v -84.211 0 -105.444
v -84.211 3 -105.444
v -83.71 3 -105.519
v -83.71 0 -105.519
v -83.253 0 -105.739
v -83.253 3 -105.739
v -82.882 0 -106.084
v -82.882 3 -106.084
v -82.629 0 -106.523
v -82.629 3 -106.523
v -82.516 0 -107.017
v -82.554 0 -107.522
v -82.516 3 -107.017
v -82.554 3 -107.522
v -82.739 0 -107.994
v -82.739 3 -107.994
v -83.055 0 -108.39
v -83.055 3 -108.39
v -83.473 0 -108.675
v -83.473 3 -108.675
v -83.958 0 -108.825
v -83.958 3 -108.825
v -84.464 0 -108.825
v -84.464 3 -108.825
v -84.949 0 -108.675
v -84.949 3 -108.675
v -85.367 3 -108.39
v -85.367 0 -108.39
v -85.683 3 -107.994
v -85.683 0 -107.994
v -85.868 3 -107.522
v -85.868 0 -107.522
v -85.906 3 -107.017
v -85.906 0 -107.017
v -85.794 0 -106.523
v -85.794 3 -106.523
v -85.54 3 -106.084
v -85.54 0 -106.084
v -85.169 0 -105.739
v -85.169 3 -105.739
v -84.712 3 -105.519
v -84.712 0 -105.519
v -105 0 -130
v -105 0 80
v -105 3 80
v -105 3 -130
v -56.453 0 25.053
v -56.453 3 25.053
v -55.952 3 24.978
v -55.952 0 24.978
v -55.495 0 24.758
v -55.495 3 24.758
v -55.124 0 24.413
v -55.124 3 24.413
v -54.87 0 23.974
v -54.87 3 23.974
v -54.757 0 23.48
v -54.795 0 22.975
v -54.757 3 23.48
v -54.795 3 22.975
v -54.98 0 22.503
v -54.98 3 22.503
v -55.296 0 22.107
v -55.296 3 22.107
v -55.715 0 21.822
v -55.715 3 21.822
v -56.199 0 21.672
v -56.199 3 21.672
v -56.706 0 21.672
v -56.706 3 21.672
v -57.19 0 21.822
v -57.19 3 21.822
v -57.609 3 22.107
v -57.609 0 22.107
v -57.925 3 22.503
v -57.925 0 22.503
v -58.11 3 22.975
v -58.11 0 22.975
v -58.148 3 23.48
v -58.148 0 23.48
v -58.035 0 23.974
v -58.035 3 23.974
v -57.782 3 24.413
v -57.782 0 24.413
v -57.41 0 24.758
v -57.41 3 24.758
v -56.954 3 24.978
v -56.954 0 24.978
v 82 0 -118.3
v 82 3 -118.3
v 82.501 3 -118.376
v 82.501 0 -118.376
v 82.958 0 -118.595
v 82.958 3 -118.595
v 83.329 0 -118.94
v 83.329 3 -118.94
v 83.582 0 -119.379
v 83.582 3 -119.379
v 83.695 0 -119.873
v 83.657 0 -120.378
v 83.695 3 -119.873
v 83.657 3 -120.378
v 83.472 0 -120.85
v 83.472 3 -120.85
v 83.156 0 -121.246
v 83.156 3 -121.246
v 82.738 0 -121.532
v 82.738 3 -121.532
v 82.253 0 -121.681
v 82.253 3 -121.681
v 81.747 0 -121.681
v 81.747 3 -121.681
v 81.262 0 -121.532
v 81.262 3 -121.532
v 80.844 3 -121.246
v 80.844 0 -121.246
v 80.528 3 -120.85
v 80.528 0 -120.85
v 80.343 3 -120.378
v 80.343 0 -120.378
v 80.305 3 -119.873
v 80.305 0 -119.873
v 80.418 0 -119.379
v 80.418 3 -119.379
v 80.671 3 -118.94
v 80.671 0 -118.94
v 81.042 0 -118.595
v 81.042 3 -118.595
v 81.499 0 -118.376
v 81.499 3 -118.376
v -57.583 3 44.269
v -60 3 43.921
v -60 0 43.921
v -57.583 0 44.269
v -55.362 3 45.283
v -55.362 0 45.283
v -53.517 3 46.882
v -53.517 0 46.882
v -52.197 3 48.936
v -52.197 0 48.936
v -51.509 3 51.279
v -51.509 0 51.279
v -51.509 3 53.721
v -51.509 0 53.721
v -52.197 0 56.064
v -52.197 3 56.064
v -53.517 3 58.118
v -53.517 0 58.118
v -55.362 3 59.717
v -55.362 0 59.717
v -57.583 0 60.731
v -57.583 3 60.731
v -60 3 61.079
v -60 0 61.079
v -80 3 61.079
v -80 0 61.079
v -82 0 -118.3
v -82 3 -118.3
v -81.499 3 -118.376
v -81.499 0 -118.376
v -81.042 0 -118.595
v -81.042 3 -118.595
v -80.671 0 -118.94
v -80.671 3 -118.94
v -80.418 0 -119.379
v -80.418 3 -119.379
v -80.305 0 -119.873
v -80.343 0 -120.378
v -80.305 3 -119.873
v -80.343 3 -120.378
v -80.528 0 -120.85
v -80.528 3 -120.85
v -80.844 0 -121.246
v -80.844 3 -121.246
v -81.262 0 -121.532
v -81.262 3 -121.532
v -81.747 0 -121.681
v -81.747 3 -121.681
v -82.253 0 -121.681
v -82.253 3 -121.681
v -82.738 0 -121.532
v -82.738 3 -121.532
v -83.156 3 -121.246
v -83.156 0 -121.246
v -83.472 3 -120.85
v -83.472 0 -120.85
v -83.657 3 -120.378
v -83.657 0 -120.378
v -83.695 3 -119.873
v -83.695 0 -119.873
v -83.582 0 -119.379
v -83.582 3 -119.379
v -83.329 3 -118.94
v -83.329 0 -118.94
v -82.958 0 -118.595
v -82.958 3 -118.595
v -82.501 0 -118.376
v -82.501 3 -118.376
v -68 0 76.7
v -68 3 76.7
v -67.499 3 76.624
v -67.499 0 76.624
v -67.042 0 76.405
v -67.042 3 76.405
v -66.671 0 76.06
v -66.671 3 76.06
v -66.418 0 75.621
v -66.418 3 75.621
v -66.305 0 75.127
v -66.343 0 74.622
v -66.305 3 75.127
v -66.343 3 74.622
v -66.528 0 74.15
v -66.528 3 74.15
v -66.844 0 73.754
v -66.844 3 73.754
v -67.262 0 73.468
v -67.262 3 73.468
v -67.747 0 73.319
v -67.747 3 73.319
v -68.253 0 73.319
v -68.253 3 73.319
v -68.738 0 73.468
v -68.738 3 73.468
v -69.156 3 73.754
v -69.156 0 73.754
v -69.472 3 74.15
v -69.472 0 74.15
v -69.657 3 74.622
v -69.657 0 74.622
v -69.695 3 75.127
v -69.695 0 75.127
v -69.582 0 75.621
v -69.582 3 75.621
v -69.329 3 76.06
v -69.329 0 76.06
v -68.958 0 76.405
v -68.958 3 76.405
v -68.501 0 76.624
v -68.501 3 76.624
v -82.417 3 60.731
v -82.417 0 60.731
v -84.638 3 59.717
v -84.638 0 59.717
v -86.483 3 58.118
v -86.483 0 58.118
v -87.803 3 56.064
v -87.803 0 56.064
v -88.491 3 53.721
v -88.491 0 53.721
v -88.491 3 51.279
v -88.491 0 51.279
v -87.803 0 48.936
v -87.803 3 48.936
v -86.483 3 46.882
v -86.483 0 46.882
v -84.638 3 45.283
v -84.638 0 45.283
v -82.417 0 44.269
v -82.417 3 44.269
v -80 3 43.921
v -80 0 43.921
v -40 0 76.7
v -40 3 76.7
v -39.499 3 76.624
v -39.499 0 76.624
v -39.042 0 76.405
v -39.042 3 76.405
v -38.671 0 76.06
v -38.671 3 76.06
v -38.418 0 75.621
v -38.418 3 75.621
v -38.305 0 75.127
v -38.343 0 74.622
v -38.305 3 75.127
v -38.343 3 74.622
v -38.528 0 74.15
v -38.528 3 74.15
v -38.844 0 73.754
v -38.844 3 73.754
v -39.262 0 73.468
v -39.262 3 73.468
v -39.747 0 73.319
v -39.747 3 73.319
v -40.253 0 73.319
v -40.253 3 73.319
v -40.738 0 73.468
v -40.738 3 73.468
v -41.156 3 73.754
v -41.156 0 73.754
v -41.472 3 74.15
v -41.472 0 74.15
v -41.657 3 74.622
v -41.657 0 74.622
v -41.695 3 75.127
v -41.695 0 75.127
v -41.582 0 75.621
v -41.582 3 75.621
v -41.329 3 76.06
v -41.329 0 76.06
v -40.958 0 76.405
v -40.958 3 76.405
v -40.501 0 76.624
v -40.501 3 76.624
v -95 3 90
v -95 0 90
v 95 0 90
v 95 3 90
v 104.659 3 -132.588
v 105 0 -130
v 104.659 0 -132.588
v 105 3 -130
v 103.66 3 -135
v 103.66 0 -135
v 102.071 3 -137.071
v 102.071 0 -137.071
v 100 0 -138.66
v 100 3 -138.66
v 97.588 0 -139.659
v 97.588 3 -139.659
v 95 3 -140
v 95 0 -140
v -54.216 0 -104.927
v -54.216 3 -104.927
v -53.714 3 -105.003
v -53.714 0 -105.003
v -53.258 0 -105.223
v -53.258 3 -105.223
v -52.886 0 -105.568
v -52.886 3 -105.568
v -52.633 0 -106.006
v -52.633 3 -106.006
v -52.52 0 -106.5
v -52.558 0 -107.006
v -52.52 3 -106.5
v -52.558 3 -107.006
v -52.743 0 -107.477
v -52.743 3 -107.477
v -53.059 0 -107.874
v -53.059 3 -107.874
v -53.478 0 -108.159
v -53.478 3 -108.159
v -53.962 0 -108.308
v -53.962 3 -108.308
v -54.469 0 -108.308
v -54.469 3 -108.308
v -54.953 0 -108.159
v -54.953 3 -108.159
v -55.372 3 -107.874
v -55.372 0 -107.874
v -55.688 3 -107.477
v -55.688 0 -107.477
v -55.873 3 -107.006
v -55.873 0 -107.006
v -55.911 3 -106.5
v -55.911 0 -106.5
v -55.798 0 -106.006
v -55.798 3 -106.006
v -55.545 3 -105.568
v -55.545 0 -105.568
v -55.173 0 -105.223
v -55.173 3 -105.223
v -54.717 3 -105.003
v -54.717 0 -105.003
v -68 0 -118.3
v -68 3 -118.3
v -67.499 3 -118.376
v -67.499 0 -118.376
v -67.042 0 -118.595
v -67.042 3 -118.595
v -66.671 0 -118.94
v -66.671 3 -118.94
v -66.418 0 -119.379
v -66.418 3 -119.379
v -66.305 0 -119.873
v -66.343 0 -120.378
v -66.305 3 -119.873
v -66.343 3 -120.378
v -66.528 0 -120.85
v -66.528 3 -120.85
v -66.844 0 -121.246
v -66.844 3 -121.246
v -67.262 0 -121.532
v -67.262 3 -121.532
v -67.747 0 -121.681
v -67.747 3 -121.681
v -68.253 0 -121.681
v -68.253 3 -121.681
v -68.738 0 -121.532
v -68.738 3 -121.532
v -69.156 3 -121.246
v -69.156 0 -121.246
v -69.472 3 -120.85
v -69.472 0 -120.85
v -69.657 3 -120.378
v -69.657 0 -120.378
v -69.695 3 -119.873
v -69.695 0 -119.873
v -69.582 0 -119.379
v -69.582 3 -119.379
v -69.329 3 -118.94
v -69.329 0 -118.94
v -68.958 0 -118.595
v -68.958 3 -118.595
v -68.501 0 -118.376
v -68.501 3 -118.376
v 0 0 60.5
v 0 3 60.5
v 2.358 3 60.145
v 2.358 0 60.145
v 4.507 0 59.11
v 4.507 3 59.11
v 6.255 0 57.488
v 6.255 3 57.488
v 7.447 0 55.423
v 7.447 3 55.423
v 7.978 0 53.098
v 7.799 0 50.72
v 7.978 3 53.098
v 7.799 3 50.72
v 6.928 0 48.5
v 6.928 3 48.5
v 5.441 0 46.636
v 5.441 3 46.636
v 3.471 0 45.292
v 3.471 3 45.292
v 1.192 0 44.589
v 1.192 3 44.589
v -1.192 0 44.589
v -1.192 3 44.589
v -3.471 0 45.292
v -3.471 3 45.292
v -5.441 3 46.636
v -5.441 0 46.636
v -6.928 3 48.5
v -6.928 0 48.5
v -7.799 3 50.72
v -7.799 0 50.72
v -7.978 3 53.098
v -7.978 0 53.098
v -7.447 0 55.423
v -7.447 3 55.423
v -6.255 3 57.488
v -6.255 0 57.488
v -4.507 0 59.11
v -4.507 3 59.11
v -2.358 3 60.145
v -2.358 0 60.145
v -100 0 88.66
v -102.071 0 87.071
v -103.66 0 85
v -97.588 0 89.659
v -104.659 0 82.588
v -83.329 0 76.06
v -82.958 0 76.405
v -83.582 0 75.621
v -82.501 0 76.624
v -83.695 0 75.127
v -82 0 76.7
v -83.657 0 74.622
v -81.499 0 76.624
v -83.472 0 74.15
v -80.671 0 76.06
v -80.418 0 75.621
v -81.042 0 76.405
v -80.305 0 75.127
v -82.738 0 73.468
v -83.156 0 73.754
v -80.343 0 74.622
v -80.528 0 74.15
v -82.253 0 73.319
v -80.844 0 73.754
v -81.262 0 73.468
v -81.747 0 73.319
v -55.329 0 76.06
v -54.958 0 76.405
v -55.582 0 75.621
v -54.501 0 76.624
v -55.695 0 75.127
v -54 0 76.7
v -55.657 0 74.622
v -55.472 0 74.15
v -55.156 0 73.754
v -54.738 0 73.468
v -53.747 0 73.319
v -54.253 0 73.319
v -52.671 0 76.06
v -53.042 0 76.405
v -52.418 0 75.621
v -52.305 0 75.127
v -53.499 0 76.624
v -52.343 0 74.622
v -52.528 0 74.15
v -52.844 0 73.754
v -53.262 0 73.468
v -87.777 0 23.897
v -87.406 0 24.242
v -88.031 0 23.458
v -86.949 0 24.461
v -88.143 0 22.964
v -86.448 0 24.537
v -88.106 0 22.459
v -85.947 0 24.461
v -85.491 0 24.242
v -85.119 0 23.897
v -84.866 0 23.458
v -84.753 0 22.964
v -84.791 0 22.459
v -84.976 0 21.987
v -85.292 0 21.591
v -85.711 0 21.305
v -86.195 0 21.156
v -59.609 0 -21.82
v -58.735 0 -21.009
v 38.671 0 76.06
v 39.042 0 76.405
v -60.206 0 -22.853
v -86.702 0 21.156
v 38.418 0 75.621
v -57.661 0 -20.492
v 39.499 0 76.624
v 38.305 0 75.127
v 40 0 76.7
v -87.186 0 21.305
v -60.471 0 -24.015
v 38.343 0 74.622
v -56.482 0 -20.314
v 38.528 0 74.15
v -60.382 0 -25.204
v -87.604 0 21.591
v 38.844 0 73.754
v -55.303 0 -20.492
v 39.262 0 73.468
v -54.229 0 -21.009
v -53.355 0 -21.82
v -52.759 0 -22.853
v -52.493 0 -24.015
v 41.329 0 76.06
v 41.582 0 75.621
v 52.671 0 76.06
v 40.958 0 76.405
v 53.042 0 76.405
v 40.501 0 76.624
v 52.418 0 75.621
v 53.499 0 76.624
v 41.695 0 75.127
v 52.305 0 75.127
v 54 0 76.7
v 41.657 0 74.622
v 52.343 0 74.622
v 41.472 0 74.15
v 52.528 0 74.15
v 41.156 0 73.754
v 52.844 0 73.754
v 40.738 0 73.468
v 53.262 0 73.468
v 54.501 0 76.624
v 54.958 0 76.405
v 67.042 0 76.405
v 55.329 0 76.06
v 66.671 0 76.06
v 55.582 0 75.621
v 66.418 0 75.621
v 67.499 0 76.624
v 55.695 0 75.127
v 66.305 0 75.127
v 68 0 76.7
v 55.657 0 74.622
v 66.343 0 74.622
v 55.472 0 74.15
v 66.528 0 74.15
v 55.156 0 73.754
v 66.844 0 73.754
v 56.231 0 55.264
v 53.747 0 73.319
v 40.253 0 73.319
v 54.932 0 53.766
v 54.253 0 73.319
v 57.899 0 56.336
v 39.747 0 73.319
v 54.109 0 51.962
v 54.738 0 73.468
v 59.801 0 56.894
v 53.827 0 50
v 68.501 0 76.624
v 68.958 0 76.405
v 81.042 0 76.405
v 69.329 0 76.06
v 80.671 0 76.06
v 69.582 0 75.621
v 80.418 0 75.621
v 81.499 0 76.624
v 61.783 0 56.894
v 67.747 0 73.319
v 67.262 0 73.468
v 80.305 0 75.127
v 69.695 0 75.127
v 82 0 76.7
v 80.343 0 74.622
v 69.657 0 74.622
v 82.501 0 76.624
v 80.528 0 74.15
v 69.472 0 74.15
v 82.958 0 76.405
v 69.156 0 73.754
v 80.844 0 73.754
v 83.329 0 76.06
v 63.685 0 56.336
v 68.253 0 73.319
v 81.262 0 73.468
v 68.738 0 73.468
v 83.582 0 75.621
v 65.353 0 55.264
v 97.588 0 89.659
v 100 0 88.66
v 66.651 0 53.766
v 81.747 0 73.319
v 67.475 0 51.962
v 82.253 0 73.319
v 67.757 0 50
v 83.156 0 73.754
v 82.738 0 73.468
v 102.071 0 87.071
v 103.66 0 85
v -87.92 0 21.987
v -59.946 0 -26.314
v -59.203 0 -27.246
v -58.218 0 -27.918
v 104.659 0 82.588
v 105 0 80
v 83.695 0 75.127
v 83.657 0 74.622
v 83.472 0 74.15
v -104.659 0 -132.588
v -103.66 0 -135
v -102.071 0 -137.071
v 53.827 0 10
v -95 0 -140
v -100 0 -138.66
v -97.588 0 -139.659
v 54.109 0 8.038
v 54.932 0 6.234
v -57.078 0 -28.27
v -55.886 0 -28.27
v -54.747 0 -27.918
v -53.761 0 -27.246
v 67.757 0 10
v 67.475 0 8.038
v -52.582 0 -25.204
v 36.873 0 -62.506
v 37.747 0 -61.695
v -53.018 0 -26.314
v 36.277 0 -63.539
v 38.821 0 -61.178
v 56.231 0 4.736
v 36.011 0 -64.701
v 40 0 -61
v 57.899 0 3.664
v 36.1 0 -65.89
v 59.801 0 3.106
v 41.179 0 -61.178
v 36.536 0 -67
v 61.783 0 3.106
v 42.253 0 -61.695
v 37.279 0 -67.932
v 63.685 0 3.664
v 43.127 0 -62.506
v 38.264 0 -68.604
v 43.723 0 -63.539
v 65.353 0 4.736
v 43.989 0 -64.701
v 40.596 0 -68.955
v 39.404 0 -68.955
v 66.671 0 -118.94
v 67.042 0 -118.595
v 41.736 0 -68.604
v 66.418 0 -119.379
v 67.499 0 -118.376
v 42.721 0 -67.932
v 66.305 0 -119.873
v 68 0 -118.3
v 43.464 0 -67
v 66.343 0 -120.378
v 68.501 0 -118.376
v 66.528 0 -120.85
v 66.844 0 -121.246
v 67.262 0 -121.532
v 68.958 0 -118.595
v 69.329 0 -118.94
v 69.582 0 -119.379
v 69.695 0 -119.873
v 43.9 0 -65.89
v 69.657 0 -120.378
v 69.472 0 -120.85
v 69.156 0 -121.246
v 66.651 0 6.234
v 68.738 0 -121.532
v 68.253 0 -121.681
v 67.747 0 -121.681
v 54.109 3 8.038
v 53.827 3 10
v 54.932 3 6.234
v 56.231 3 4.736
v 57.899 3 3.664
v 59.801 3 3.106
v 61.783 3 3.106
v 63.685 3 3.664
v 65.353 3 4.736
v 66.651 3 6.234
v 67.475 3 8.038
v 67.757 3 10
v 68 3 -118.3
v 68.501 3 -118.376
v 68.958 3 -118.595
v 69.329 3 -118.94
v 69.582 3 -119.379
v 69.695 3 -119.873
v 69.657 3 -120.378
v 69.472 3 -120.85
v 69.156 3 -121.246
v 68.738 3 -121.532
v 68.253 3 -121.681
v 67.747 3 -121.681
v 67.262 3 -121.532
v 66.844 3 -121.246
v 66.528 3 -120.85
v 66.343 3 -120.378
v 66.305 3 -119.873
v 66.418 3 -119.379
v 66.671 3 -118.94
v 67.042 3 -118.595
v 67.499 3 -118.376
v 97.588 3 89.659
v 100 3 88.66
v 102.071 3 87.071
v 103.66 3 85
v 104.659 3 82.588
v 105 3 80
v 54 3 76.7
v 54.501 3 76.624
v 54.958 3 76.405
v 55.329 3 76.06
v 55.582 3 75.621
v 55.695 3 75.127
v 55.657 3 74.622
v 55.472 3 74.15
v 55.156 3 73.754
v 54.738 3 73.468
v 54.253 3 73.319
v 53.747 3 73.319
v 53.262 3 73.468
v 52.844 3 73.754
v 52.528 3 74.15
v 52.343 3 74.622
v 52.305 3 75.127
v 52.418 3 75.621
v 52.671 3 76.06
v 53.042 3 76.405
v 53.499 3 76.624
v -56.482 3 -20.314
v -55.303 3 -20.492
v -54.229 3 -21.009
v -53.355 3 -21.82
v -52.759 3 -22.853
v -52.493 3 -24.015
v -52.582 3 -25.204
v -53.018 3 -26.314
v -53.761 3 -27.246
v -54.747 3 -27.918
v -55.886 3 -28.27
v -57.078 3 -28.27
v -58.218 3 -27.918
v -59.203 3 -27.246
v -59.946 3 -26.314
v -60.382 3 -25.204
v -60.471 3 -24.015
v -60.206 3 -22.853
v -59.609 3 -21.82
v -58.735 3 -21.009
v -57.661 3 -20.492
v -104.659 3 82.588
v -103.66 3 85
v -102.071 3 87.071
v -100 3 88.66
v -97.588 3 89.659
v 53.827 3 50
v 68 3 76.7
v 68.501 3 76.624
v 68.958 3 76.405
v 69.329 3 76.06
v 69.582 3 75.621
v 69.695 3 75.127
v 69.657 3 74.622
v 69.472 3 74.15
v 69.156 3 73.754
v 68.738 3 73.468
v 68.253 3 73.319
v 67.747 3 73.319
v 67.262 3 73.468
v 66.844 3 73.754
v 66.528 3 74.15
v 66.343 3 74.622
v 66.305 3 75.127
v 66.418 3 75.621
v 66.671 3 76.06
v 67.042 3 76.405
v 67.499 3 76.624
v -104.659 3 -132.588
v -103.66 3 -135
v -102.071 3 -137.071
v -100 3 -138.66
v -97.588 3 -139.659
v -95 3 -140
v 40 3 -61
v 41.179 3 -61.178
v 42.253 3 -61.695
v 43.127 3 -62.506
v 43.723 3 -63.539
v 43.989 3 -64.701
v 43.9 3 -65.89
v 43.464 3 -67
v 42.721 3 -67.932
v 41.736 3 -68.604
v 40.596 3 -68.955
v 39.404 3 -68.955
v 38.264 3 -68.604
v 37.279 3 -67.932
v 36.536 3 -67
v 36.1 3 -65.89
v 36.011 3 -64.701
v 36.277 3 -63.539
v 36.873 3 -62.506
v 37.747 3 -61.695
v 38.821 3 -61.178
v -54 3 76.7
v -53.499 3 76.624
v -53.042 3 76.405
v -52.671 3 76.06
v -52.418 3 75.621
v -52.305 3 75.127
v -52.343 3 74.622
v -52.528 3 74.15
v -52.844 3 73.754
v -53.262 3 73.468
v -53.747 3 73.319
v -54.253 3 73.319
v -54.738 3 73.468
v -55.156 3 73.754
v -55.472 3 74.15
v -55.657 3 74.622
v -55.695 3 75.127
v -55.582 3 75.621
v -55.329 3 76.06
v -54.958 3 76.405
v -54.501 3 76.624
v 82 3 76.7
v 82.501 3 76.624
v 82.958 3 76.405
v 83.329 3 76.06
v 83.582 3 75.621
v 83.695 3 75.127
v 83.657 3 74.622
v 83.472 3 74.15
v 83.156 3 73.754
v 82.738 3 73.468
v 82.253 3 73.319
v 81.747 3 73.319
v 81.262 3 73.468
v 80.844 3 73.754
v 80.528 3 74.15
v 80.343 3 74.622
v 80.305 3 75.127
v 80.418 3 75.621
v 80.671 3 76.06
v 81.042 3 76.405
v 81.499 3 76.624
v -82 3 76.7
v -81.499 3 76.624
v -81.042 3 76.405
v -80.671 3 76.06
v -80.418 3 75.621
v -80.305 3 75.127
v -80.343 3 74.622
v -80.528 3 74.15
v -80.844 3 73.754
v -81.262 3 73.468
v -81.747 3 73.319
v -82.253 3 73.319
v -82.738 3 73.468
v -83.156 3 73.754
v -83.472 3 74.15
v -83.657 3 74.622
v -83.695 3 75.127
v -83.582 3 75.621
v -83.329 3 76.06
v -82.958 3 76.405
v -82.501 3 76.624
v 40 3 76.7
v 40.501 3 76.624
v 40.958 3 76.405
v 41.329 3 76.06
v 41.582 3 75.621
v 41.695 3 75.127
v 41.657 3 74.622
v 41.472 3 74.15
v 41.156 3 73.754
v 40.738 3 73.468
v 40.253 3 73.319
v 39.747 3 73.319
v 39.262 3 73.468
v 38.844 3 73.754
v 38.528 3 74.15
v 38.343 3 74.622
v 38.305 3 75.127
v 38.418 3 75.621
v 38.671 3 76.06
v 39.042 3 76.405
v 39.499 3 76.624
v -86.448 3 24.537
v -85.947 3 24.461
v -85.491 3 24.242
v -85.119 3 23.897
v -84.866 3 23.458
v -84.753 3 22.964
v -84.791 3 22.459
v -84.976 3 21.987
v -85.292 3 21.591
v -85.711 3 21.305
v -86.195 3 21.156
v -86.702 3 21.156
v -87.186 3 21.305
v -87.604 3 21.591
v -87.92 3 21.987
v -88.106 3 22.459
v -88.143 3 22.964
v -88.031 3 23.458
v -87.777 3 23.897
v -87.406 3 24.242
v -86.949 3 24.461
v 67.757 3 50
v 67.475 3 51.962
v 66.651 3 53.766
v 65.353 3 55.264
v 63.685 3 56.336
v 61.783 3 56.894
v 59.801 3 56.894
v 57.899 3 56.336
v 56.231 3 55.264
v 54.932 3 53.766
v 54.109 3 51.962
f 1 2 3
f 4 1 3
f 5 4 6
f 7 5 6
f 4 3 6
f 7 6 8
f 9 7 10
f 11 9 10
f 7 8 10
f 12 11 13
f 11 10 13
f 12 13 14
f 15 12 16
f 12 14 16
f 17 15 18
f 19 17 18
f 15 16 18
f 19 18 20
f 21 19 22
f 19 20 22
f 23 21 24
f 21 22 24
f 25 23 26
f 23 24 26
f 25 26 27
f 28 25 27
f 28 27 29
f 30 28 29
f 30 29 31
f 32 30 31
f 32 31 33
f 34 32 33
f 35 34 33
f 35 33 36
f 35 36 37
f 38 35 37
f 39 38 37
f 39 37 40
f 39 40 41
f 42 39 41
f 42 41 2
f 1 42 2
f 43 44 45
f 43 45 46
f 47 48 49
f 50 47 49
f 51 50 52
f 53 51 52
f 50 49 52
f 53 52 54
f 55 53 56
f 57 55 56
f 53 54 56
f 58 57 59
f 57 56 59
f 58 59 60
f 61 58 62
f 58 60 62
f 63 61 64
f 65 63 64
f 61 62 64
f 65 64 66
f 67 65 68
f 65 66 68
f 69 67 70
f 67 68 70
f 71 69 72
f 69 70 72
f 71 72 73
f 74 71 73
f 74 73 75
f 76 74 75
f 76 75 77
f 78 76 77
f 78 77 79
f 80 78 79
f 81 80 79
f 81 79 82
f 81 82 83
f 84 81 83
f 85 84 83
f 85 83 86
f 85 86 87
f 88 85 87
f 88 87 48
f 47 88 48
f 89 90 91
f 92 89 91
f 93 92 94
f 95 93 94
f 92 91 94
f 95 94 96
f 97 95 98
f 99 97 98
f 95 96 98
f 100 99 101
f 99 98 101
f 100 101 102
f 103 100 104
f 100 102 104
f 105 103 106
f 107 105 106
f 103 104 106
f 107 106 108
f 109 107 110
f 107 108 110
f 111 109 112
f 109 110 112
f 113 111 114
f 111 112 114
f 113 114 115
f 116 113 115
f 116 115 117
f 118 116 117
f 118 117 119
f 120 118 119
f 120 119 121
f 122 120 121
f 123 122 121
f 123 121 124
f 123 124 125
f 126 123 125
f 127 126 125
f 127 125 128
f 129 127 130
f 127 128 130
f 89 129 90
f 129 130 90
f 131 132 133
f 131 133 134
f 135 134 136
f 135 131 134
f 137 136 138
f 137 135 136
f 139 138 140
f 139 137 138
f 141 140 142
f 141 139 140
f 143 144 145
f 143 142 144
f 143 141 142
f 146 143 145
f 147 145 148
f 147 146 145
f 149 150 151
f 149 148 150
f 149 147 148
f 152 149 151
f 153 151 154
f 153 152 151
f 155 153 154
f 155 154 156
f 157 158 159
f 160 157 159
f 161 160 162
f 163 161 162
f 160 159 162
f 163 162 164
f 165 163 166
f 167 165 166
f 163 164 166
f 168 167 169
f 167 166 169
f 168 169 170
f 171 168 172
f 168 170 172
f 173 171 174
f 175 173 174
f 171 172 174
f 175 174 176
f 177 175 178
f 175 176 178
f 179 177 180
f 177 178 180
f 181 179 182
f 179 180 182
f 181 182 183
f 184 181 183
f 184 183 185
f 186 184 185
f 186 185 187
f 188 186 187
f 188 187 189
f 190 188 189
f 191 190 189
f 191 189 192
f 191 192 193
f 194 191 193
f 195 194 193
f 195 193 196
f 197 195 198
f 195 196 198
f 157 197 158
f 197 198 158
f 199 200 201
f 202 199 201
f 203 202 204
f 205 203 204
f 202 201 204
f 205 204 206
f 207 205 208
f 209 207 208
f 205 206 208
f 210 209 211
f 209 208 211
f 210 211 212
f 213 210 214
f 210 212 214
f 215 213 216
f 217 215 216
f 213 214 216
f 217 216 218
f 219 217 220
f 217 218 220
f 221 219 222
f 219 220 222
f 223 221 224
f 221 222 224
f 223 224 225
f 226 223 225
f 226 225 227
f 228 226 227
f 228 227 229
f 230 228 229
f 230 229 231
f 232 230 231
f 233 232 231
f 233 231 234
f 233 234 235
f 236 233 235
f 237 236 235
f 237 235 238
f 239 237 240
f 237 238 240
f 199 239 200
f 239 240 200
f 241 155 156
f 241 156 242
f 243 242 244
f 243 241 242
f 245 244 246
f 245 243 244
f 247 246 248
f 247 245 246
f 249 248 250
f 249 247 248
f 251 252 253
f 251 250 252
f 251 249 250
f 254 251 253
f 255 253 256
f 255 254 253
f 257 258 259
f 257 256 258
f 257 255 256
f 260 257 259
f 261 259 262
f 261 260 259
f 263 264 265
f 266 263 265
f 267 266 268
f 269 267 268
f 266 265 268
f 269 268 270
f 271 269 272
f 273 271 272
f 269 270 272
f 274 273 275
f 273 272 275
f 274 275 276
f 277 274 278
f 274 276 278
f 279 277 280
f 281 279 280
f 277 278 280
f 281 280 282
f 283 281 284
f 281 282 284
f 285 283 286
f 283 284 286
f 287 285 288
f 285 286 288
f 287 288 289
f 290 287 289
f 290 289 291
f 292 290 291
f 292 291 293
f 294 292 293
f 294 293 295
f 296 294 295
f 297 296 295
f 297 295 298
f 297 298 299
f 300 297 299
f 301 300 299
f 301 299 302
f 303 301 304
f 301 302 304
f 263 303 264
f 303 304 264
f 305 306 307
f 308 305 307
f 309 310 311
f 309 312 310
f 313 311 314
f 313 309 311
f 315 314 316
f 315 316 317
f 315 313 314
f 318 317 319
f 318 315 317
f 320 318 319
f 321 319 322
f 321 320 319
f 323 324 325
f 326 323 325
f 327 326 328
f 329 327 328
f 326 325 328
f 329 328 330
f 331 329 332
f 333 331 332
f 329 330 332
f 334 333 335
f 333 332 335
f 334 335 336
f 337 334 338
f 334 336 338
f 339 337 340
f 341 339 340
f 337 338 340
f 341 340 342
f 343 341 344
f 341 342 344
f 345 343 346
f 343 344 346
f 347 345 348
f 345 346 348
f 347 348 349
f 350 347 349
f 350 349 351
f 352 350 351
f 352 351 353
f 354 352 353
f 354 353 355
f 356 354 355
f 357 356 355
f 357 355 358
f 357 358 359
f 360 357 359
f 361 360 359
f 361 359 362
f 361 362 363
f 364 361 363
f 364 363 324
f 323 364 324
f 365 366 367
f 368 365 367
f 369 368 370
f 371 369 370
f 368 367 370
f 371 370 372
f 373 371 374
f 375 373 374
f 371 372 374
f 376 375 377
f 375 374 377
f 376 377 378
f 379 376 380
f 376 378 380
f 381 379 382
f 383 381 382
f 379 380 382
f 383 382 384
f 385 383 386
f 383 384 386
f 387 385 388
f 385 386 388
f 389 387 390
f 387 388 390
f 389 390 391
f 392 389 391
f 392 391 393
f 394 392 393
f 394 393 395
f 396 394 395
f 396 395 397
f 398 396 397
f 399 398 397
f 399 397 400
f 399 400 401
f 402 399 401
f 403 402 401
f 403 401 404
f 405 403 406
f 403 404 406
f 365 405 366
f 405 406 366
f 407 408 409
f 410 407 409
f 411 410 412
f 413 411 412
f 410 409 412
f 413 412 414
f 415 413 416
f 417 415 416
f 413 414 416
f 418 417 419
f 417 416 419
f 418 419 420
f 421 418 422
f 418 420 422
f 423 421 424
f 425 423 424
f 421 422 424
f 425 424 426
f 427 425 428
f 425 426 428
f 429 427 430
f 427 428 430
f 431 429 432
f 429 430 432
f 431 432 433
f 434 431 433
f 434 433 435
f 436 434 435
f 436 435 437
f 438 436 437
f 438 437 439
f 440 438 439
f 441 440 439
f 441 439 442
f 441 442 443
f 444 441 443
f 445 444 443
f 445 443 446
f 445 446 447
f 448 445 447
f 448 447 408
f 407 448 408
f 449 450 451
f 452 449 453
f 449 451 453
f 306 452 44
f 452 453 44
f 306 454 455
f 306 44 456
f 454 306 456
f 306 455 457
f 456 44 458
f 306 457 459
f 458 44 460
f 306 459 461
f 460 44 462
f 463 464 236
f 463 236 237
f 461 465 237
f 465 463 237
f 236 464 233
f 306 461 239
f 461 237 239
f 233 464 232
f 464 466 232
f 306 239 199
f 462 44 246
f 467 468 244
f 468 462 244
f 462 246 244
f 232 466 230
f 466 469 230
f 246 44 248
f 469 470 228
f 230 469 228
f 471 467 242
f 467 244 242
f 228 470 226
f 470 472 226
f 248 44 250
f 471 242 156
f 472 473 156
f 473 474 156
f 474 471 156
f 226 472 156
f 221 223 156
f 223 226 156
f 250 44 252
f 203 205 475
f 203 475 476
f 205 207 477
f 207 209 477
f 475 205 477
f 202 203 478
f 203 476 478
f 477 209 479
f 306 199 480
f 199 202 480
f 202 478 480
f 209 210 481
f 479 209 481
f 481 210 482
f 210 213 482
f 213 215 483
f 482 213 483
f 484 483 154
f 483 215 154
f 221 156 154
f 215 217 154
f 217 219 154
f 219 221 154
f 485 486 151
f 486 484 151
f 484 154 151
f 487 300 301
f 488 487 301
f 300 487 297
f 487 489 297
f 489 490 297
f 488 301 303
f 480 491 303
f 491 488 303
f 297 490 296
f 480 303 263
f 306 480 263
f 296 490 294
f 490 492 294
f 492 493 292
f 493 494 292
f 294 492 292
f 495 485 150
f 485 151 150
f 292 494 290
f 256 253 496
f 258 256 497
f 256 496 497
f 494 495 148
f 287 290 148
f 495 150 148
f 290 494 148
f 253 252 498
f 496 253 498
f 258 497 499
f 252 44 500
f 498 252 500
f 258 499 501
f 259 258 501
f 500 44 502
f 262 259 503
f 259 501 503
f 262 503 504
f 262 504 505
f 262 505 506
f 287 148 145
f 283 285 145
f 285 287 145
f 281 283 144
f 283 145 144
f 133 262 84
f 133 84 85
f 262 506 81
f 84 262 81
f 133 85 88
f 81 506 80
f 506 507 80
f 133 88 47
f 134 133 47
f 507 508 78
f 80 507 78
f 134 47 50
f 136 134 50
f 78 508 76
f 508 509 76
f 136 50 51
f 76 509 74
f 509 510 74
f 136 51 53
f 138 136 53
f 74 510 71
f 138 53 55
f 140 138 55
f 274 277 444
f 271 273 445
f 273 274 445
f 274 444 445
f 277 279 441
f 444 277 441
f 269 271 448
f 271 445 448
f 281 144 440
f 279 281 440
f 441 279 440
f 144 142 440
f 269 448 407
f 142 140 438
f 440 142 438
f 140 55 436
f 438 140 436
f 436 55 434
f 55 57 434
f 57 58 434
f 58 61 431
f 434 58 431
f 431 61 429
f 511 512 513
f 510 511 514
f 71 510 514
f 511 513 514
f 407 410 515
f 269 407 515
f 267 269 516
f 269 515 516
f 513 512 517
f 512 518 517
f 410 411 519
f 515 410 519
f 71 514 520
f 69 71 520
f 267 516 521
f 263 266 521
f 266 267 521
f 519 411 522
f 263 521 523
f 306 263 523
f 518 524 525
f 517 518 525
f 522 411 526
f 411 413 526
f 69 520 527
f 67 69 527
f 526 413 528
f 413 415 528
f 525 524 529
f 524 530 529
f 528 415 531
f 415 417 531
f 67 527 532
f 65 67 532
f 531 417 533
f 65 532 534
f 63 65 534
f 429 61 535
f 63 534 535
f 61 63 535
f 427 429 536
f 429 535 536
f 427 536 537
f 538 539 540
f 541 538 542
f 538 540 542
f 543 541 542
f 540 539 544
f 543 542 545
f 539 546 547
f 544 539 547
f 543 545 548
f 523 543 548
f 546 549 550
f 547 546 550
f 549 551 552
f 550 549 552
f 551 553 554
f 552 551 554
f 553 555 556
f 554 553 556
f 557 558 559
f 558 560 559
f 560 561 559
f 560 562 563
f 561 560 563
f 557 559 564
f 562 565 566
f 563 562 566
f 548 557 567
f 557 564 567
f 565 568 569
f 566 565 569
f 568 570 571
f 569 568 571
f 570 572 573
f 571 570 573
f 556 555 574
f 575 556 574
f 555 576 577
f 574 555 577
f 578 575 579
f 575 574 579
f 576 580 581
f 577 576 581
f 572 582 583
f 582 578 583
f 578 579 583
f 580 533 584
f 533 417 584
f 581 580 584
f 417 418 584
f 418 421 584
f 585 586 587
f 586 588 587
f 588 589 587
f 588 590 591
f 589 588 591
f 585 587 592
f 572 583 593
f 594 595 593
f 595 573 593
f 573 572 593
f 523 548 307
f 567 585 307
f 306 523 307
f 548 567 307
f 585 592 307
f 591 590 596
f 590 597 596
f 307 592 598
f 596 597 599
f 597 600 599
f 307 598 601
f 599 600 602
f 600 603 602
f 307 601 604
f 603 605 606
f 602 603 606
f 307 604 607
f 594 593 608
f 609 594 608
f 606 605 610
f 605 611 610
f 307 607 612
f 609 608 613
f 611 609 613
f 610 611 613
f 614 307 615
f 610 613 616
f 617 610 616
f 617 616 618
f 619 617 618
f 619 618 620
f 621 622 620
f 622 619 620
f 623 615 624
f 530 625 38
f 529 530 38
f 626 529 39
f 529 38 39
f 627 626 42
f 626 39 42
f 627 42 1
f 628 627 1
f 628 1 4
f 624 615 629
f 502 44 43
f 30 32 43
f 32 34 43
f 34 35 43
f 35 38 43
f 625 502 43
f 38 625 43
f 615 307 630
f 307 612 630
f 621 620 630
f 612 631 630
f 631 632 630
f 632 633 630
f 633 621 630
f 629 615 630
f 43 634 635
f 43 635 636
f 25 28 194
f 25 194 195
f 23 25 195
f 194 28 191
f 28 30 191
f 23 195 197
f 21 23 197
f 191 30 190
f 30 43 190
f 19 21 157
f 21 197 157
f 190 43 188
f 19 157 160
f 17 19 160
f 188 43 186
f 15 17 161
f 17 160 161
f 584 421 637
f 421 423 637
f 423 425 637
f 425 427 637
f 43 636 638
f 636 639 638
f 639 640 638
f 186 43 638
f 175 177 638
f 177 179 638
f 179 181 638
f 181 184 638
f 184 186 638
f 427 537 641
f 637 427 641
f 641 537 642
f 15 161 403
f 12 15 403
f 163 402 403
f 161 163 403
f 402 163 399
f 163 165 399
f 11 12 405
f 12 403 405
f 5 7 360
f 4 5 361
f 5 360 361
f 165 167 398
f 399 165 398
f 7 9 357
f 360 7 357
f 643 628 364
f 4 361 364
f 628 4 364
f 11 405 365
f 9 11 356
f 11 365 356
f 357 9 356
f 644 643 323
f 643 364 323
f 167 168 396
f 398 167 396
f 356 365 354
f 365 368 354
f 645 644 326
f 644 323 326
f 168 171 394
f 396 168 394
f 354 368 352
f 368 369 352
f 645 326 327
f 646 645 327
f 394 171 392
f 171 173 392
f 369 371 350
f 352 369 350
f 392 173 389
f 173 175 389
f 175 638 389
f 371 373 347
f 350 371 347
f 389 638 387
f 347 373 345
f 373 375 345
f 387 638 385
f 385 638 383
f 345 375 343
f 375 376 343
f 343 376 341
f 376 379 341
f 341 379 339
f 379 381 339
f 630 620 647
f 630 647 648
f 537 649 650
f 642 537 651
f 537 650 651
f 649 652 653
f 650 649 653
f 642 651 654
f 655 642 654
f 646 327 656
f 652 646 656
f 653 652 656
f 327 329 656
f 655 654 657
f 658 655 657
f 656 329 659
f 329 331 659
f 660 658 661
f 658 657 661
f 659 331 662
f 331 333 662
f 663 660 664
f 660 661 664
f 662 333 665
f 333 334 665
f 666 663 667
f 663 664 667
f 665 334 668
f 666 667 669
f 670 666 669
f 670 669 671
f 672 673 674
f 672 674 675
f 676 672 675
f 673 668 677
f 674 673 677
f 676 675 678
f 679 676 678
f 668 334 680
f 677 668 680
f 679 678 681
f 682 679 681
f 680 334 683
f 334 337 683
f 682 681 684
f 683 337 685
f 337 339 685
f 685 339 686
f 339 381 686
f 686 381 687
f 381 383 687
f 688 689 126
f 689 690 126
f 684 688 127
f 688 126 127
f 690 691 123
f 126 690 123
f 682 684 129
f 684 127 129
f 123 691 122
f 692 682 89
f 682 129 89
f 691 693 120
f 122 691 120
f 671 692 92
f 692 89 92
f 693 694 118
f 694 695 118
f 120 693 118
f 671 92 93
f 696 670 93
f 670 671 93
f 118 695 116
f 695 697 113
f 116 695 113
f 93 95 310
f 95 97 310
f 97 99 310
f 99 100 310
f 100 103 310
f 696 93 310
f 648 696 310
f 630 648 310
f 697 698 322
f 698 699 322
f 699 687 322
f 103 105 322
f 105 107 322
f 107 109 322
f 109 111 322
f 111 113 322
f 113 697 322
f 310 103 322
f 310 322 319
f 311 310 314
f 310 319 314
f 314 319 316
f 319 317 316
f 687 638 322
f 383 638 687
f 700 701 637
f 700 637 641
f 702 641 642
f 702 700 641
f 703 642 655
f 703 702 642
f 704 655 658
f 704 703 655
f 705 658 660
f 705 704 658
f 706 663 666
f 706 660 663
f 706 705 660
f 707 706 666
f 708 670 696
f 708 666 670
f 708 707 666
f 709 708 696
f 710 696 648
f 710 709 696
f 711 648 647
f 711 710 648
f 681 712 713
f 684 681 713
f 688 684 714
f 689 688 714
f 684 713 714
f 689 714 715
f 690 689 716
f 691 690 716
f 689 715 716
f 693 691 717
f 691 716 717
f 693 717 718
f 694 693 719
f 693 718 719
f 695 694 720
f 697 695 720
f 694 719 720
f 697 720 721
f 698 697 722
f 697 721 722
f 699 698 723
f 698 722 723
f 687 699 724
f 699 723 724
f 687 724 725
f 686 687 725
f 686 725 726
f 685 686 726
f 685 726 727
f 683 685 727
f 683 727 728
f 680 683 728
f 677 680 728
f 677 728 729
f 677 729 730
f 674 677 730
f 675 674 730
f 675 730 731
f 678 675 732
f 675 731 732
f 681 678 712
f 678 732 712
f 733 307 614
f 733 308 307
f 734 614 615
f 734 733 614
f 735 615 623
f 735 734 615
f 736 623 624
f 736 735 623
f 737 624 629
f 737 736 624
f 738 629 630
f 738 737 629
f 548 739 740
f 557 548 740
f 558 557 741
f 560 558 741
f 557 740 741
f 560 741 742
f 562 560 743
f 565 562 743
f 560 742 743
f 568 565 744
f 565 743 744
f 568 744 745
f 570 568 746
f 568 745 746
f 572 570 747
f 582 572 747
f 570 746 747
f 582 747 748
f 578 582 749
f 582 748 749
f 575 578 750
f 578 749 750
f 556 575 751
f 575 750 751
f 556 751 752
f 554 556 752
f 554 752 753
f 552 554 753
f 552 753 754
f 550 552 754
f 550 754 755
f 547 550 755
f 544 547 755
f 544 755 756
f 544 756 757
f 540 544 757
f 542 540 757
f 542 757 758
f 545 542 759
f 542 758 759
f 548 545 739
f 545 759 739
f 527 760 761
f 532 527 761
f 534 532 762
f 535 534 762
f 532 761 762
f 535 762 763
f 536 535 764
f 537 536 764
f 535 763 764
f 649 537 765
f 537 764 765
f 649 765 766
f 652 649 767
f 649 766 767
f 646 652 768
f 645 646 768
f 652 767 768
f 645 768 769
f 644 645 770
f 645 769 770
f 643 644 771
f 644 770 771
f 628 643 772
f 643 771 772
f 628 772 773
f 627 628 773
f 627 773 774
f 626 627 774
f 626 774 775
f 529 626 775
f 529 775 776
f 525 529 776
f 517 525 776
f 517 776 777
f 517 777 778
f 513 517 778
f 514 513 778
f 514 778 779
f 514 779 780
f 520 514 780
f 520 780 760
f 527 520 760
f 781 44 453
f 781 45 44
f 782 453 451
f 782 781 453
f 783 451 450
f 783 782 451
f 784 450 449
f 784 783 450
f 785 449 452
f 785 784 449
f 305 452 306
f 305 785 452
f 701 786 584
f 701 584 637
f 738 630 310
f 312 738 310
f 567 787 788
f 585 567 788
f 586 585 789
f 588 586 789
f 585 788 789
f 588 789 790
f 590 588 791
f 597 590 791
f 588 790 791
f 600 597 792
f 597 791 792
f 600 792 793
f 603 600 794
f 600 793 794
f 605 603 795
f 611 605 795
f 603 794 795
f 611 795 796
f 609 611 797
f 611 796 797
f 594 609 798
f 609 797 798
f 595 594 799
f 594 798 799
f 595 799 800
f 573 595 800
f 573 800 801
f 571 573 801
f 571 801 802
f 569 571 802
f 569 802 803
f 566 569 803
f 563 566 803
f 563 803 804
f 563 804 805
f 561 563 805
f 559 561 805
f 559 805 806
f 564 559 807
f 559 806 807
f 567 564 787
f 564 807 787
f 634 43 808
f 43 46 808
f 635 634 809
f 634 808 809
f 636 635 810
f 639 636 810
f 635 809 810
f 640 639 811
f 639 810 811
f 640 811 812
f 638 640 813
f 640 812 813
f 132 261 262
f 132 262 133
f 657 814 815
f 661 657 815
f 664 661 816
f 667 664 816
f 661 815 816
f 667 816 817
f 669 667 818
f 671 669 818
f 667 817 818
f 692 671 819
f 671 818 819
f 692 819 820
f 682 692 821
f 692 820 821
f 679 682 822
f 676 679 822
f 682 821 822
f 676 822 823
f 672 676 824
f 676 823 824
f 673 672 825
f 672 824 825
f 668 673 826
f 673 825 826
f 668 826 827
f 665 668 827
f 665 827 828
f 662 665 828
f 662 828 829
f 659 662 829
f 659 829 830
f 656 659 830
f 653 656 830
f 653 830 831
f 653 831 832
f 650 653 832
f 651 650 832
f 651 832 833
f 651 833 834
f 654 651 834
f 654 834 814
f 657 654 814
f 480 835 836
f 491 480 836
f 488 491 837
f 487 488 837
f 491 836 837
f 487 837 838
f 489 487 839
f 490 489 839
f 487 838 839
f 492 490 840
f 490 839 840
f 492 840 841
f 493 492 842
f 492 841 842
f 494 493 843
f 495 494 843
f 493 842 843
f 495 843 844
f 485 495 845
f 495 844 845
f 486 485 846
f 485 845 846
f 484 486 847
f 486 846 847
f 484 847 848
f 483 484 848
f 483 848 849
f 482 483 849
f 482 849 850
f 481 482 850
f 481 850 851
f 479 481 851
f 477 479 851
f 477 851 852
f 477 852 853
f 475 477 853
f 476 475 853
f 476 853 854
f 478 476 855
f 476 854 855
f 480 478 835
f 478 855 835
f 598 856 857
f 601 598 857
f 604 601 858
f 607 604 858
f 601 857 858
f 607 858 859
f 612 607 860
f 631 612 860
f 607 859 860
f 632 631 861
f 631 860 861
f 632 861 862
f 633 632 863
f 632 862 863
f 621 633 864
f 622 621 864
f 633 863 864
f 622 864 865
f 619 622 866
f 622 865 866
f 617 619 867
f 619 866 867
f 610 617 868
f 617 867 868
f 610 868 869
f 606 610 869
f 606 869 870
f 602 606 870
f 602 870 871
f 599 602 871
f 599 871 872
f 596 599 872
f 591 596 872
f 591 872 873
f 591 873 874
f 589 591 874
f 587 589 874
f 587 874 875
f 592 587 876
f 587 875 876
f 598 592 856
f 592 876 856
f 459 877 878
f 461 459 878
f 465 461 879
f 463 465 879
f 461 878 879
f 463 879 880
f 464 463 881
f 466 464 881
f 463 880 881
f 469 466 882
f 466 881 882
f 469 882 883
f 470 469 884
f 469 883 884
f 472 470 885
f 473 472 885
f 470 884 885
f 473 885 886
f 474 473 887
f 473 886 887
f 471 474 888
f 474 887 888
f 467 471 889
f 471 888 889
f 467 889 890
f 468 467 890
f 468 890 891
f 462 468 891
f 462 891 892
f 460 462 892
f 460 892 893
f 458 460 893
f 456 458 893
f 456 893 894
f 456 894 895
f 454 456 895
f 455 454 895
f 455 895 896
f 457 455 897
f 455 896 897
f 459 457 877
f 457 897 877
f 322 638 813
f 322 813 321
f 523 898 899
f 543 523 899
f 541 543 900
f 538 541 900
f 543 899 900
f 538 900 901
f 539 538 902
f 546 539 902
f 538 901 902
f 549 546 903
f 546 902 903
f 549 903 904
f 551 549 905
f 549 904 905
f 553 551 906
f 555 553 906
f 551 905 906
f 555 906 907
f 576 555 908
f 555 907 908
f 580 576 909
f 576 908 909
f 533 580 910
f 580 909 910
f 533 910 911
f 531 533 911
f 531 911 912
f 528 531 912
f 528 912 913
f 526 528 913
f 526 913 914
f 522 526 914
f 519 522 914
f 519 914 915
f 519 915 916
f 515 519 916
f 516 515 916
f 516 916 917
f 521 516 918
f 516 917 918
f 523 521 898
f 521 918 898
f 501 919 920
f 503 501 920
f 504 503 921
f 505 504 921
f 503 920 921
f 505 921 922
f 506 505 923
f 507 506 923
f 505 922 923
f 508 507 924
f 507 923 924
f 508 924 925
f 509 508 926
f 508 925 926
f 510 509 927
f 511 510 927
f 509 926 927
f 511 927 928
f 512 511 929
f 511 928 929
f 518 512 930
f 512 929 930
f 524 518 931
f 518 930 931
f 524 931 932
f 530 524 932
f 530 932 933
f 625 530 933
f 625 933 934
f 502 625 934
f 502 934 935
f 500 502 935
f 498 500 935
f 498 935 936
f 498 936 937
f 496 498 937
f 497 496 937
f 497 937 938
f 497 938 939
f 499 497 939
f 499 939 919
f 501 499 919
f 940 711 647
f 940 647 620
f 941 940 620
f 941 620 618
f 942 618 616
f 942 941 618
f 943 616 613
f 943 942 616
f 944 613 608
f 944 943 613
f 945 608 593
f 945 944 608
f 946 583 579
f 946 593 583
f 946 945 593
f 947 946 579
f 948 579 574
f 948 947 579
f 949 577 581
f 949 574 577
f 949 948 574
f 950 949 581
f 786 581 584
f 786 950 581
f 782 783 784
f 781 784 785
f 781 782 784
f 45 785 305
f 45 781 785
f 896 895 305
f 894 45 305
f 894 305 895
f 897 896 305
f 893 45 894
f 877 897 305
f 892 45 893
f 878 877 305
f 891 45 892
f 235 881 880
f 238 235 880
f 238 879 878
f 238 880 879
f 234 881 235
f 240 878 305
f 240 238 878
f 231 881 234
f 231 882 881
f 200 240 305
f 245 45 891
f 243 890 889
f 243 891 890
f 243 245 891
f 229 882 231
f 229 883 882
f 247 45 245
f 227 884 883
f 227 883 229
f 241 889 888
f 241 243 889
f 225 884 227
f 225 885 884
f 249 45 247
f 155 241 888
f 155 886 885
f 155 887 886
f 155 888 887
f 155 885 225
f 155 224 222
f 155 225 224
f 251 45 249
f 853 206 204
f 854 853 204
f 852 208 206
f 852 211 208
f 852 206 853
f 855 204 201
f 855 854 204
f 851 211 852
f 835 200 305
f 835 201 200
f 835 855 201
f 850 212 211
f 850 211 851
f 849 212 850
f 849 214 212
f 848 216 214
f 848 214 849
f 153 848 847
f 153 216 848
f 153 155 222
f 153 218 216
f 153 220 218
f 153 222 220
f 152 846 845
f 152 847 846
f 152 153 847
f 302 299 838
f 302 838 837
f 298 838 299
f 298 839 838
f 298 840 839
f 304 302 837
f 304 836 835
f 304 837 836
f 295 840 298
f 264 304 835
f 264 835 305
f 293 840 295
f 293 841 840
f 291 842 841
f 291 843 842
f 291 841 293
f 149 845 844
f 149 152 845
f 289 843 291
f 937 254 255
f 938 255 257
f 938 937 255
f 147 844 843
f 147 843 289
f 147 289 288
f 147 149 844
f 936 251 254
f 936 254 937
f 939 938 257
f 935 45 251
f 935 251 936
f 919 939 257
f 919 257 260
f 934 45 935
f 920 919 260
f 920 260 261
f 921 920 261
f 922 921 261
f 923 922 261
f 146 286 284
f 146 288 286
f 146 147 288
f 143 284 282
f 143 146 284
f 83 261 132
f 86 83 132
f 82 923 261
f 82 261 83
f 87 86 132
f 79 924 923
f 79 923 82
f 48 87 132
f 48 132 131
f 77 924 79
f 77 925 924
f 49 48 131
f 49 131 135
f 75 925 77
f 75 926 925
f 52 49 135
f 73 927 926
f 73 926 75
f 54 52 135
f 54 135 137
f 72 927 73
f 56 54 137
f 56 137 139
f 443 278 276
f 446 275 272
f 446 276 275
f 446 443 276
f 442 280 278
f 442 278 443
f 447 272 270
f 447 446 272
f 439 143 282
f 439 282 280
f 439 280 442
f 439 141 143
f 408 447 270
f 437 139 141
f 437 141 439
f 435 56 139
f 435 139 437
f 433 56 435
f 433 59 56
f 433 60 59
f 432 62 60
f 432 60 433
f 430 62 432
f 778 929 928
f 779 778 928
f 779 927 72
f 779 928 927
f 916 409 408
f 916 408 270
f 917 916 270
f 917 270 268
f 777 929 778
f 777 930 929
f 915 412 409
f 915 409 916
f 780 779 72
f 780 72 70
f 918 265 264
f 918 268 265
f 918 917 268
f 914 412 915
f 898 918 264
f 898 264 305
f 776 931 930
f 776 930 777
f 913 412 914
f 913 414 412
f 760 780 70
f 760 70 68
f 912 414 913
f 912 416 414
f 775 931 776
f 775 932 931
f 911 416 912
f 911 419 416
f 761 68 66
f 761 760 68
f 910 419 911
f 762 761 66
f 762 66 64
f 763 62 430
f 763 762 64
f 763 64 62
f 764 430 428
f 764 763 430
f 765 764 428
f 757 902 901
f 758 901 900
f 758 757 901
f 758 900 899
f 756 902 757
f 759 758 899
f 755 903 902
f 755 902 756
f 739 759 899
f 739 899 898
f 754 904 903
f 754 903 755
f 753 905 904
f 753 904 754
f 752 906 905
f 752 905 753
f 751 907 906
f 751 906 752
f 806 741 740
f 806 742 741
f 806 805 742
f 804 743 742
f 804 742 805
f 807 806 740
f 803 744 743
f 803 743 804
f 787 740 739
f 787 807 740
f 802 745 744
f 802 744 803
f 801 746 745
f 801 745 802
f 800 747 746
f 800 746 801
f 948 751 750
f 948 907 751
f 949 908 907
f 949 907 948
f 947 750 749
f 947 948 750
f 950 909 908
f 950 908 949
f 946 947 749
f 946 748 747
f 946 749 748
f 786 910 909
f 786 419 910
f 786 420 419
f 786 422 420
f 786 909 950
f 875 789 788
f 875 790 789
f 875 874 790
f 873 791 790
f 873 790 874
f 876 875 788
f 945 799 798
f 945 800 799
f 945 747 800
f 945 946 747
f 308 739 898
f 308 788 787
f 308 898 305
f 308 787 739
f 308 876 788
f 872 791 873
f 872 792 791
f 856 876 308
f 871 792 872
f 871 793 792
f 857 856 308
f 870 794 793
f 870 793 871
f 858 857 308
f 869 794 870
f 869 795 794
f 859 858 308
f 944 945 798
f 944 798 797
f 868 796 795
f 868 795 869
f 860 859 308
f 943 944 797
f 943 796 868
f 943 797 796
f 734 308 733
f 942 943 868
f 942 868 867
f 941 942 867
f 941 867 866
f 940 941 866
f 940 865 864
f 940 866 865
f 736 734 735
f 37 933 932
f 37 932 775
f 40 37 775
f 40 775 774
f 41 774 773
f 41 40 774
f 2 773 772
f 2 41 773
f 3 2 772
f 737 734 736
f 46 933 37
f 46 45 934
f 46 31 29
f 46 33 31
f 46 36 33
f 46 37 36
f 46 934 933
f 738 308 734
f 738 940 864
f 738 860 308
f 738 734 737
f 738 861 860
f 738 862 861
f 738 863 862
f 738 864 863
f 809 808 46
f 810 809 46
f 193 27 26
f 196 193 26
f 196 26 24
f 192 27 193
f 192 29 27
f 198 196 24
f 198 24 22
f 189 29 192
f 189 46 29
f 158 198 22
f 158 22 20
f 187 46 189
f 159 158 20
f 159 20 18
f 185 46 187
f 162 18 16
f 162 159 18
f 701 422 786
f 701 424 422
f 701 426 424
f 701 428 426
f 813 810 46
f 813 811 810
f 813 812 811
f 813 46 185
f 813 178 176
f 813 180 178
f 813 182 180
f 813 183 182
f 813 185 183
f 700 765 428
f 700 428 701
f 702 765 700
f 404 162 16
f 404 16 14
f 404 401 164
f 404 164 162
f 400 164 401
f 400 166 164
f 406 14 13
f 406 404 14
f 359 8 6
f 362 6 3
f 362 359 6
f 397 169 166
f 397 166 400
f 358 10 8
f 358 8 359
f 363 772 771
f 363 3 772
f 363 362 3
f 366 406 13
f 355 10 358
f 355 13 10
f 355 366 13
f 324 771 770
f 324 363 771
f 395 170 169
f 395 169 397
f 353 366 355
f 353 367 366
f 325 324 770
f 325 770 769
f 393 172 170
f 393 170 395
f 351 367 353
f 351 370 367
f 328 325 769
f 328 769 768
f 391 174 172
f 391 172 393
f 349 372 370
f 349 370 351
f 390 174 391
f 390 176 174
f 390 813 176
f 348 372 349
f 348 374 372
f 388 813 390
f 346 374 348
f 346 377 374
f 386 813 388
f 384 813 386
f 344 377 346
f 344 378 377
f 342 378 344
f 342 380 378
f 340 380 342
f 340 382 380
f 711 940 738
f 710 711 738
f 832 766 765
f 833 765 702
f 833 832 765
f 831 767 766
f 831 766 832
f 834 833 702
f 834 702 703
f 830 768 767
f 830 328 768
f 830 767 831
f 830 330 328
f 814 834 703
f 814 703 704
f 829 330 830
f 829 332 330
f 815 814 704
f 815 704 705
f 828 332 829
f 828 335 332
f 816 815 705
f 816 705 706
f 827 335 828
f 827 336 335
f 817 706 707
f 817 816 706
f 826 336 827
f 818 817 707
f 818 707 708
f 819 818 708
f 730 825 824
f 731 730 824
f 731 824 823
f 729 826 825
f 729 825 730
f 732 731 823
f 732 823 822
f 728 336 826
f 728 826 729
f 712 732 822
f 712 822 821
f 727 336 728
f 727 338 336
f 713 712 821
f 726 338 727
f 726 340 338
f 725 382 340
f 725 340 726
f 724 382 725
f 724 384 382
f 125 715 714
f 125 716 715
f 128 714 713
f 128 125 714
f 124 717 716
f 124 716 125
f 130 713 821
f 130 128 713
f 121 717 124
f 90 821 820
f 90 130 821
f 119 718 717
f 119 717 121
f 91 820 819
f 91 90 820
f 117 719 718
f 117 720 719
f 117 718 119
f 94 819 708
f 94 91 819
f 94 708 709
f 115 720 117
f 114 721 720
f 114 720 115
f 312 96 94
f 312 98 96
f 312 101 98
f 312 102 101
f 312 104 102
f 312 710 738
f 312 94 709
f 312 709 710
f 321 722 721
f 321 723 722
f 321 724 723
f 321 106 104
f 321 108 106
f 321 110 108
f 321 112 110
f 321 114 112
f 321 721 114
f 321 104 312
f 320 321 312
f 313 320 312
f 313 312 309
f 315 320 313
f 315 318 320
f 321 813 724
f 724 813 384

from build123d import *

# Parameters (mm, degrees)
SKETCH1_W           = 210
SKETCH1_H           = 230
BOSS_EXTRUDE1_DEPTH = 3
FILLET1_R           = 10
SKETCH2_R           = 1.7
CUT_EXTRUDE1_DEPTH  = 3
SKETCH3_R           = 4
CUT_EXTRUDE2_DEPTH  = 176.025712397
SKETCH4_R           = 8
CUT_EXTRUDE3_DEPTH  = 176.025712397
CUT_EXTRUDE4_DEPTH  = 176.025712397
SKETCH6_R           = 4
SKETCH6_R_2         = 1.7
CUT_EXTRUDE5_DEPTH  = 176.025712397


with BuildPart() as part:
    # Sketch1 → Boss-Extrude1 (new body)
    with BuildSketch(Plane(origin=(0, 0, 0), x_dir=(1, 0, 0), z_dir=(0, 1, 0))):
        with Locations((0, 25)):
            Rectangle(SKETCH1_W, SKETCH1_H)
    extrude(amount=BOSS_EXTRUDE1_DEPTH)

    # Fillet1
    fillet1_edges = [part.edges().sort_by_distance(p)[0] for p in [
        (105, 1.5, 90),
        (-105, 1.5, 90),
        (-105, 1.5, -140),
        (105, 1.5, -140),
    ]]
    fillet(fillet1_edges, radius=FILLET1_R)

    # Sketch2 → Cut-Extrude1 (cut)
    with BuildSketch(Plane(origin=(0, 3, 0), x_dir=(1, 0, 0), z_dir=(0, 1, 0))):
        with Locations(Location((-82, 120, 0), (0, 0, 270))):
            Circle(SKETCH2_R)
        with Locations(Location((-68, 120, 0), (0, 0, 270))):
            Circle(SKETCH2_R)
        with Locations(Location((68, 120, 0), (0, 0, 270))):
            Circle(SKETCH2_R)
        with Locations(Location((82, 120, 0), (0, 0, 270))):
            Circle(SKETCH2_R)
        with Locations(Location((-82, -75, 0), (0, 0, 270))):
            Circle(SKETCH2_R)
        with Locations(Location((-68, -75, 0), (0, 0, 270))):
            Circle(SKETCH2_R)
        with Locations(Location((68, -75, 0), (0, 0, 270))):
            Circle(SKETCH2_R)
        with Locations(Location((82, -75, 0), (0, 0, 270))):
            Circle(SKETCH2_R)
        with Locations(Location((-54, -75, 0), (0, 0, 270))):
            Circle(SKETCH2_R)
        with Locations(Location((54, -75, 0), (0, 0, 270))):
            Circle(SKETCH2_R)
        with Locations(Location((-40, -75, 0), (0, 0, 270))):
            Circle(SKETCH2_R)
        with Locations(Location((40, -75, 0), (0, 0, 270))):
            Circle(SKETCH2_R)
    extrude(amount=-CUT_EXTRUDE1_DEPTH, mode=Mode.SUBTRACT)

    # Sketch3 → Cut-Extrude2 (cut, through all)
    with BuildSketch(Plane(origin=(0, 3, 0), x_dir=(1, 0, 0), z_dir=(0, 1, 0))):
        with Locations(Location((40, 65, 0), (0, 0, 270))):
            Circle(SKETCH3_R)
    extrude(amount=-CUT_EXTRUDE2_DEPTH, mode=Mode.SUBTRACT)

    # Sketch4 → Cut-Extrude3 (cut, through all)
    with BuildSketch(Plane(origin=(0, 3, 0), x_dir=(1, 0, 0), z_dir=(0, 1, 0))):
        with Locations(Location((0, -52.5, 0), (0, 0, 270))):
            Circle(SKETCH4_R)
    extrude(amount=-CUT_EXTRUDE3_DEPTH, mode=Mode.SUBTRACT)

    # Sketch5 → Cut-Extrude4 (cut, through all)
    with BuildSketch(Plane(origin=(0, 3, 0), x_dir=(1, 0, 0), z_dir=(0, 1, 0))):
        with BuildLine():
            Line((67.757117203, -10), (67.757117203, -50))
            ThreePointArc((67.757117203, -50), (60.791955234, -56.965161969), (53.826793265, -50))
            Line((53.826793265, -50), (53.826793265, -10))
            ThreePointArc((53.826793265, -10), (60.791955234, -3.034838031), (67.757117203, -10))
        make_face()
        with BuildLine():
            Line((-80, -43.92126235), (-60, -43.92126235))
            ThreePointArc((-60, -43.92126235), (-51.42126235, -52.5), (-60, -61.07873765))
            Line((-60, -61.07873765), (-80, -61.07873765))
            ThreePointArc((-80, -61.07873765), (-88.57873765, -52.5), (-80, -43.92126235))
        make_face()
    extrude(amount=-CUT_EXTRUDE4_DEPTH, mode=Mode.SUBTRACT)

    # Sketch6 → Cut-Extrude5 (cut, through all)
    with BuildSketch(Plane(origin=(0, 3, 0), x_dir=(1, 0, 0), z_dir=(0, 1, 0))):
        with Locations(Location((-56.482041844, 24.314281351, 0), (0, 0, 270))):
            Circle(SKETCH6_R)
        with Locations(Location((-84.211086261, 107.143726059, 0), (0, 0, 270))):
            Circle(SKETCH6_R_2)
        with Locations(Location((-54.215528573, 106.627471285, 0), (0, 0, 270))):
            Circle(SKETCH6_R_2)
        with Locations(Location((-56.452632591, -23.353278696, 0), (0, 0, 270))):
            Circle(SKETCH6_R_2)
        with Locations(Location((-86.448190279, -22.837023922, 0), (0, 0, 270))):
            Circle(SKETCH6_R_2)
    extrude(amount=-CUT_EXTRUDE5_DEPTH, mode=Mode.SUBTRACT)


solid = part.part
